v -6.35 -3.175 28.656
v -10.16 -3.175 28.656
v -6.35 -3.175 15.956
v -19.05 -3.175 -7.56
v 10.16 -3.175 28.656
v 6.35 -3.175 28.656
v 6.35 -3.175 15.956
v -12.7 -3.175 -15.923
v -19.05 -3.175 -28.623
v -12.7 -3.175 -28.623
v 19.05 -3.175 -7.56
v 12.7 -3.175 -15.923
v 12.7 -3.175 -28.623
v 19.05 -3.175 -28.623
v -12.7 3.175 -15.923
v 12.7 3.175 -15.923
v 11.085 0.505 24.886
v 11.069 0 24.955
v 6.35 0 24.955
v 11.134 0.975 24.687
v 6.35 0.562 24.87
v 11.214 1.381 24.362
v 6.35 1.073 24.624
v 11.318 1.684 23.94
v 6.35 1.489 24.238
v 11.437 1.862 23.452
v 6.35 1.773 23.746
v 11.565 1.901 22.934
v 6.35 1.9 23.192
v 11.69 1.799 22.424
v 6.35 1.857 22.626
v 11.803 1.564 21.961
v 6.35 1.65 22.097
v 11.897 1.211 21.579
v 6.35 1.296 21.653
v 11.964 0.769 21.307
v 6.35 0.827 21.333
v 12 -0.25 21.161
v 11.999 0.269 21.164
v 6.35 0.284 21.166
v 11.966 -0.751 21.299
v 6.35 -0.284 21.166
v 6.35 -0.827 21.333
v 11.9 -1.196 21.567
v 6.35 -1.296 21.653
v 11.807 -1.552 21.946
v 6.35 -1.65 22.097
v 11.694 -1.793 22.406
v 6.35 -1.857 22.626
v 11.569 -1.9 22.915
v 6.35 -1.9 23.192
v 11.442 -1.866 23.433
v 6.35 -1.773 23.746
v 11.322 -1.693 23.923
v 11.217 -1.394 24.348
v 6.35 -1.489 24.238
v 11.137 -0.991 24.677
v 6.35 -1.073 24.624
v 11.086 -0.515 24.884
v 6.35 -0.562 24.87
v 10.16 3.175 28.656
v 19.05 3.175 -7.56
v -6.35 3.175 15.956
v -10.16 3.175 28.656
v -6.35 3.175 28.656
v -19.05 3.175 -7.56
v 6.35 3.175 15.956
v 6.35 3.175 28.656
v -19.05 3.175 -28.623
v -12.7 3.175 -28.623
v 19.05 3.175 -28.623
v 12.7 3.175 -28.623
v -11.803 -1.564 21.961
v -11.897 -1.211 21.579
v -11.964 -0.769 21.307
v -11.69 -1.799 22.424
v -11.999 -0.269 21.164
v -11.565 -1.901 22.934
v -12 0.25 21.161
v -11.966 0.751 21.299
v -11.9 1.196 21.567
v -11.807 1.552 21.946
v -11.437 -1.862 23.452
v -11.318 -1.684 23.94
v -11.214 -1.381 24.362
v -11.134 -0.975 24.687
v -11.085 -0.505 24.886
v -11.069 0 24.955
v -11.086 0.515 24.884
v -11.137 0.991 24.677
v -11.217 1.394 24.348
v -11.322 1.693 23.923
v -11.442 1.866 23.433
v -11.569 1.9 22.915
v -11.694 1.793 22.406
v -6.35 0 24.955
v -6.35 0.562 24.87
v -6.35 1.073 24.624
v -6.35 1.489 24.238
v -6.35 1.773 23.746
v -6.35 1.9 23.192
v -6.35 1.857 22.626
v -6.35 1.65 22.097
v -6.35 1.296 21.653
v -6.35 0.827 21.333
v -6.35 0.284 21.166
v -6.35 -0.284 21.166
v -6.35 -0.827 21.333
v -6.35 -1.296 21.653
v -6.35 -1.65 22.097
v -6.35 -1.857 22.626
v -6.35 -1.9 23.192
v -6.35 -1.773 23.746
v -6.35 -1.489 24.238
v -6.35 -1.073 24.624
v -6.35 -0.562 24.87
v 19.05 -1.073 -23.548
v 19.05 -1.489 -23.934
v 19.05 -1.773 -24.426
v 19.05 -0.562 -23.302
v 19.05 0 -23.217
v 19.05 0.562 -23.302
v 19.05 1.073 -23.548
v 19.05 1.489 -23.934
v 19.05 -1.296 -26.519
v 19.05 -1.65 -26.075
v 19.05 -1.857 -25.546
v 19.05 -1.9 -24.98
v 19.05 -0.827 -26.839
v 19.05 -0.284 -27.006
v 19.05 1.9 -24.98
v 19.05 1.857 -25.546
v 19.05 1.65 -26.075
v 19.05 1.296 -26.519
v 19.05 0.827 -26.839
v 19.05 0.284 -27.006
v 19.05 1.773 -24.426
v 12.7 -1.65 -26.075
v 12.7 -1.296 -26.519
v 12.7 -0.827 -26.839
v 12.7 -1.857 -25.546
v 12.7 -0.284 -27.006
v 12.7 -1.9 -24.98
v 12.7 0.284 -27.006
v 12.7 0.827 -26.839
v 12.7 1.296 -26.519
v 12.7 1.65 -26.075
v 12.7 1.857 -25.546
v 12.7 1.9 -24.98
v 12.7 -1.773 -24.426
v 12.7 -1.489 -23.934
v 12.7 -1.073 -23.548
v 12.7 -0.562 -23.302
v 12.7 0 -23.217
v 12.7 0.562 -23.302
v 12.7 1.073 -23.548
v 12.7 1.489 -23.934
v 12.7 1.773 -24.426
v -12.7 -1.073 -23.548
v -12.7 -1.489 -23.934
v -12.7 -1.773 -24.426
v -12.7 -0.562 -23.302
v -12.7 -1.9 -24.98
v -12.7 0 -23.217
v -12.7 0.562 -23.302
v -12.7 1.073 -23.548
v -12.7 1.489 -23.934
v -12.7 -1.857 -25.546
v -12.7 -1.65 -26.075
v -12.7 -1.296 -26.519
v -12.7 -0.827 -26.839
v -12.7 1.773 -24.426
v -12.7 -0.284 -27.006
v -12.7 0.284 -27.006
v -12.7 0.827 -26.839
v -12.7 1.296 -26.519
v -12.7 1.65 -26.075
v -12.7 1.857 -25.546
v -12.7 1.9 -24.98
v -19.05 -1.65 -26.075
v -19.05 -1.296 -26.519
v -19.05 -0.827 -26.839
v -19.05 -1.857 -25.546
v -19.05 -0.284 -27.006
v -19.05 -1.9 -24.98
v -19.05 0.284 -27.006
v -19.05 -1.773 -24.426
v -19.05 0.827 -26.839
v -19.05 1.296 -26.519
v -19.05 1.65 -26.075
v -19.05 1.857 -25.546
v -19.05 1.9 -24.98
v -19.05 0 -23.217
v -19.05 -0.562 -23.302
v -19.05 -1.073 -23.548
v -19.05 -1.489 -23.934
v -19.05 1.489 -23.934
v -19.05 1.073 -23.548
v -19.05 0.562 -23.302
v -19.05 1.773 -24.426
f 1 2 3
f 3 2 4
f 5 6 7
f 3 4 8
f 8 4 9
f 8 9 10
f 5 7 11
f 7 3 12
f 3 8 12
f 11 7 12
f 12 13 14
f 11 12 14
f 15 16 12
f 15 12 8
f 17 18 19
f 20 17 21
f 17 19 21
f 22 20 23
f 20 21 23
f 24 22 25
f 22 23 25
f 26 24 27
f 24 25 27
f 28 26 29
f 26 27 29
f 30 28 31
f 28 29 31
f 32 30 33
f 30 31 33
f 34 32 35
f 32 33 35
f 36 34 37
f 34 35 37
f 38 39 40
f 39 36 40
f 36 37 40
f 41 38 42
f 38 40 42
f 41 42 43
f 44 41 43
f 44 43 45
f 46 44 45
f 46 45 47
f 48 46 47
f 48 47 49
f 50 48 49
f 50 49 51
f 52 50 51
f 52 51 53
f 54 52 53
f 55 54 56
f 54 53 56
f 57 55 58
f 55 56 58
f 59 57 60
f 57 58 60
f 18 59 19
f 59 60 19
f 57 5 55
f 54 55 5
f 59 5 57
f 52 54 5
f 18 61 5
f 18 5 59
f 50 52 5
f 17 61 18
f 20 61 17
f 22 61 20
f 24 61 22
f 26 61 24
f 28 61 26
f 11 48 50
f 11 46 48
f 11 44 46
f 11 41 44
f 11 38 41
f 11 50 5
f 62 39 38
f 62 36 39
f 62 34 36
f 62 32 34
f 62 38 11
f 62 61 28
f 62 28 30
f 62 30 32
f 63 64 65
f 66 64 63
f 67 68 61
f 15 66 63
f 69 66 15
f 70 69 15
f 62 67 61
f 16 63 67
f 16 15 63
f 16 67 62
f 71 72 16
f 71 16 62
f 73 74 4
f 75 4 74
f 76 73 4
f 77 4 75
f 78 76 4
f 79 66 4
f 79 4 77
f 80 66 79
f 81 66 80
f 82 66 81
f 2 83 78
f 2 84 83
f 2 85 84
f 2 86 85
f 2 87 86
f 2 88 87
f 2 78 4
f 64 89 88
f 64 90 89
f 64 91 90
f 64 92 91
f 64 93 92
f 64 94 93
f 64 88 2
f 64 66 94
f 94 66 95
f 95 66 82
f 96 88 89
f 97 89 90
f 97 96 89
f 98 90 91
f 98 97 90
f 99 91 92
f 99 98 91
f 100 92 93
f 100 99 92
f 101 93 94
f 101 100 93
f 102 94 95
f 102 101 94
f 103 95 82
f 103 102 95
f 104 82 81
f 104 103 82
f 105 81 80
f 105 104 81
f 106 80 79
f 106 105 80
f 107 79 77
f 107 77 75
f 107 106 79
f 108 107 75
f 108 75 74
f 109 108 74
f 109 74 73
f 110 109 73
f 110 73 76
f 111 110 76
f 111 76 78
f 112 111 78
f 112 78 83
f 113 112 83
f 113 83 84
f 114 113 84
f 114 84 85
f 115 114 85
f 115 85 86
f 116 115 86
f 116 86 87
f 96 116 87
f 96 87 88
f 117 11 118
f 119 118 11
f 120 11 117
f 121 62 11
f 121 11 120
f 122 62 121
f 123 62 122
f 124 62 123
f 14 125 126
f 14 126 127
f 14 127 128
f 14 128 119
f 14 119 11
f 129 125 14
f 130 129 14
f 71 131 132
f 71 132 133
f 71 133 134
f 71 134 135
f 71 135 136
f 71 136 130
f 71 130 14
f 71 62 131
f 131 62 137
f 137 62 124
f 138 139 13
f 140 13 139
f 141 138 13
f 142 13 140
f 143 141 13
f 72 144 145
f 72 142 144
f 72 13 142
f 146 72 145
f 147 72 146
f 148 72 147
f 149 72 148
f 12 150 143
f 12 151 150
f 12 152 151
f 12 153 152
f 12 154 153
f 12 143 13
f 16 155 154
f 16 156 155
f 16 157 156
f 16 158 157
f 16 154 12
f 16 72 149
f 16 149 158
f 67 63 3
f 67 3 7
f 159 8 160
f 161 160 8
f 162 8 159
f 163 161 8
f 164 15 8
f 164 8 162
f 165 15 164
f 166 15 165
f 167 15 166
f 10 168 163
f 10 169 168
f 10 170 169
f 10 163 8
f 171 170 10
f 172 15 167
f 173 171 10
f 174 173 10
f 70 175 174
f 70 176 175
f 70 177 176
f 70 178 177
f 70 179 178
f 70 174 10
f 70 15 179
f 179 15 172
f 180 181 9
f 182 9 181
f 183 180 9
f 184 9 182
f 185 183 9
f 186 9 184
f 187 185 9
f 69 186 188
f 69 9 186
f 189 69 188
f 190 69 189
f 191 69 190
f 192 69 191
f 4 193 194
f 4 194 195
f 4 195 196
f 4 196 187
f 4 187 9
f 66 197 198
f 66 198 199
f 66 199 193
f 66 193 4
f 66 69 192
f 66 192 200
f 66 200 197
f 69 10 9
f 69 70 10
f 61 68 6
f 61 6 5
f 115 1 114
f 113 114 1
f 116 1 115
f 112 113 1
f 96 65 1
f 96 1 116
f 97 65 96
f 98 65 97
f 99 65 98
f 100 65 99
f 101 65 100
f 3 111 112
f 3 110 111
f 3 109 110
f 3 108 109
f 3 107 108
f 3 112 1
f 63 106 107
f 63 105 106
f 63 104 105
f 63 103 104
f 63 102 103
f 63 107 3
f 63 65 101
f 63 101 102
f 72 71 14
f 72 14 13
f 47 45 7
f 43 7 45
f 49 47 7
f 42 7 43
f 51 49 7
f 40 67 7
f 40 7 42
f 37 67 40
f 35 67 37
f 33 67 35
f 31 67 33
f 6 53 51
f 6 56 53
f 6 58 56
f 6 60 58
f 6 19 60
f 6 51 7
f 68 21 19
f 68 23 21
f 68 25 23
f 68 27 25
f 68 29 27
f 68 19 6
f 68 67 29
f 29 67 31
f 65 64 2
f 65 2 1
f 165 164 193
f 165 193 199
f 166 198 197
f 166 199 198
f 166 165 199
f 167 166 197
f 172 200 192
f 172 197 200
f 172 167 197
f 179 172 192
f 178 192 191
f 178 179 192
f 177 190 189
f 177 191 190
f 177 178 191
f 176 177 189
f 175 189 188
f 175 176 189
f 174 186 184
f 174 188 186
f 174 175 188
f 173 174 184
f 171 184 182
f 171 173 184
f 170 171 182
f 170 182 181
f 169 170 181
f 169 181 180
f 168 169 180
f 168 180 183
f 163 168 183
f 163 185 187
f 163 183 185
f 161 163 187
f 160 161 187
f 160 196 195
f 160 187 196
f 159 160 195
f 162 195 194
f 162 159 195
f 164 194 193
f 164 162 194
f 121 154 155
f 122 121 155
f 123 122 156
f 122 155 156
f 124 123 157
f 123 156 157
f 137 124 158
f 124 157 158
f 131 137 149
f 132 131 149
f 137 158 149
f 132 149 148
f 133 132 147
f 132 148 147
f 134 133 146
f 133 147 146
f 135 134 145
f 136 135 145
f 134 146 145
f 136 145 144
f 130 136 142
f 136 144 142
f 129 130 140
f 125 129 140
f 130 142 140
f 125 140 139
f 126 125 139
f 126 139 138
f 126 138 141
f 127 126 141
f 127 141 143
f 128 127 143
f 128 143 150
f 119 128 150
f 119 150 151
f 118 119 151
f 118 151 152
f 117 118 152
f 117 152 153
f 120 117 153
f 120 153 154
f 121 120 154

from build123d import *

# Parameters (mm, degrees)
BOSS_EXTRUDE1_DEPTH     = 3.175
SKETCH2_R               = 1.905
CUT_EXTRUDE1_DEPTH      = 20.05
CUT_EXTRUDE1_DEPTH_BACK = 20.05


with BuildPart() as part:
    # Sketch1 → Boss-Extrude1 (new body, symmetric)
    with BuildSketch(Plane(origin=(0, 0, 0), x_dir=(1, 0, 0), z_dir=(0, 1, 0))):
        Polygon((-19.05, 28.623002286), (-19.05, 7.559996871), (-10.16, -28.655798535), (-6.35, -28.655798535), (-6.35, -15.955798535), (6.35, -15.955798535), (6.35, -28.655798535), (10.16, -28.655798535), (19.05, 7.559996871), (19.05, 28.623002286), (12.7, 28.623002286), (12.7, 15.923002286), (-12.7, 15.923002286), (-12.7, 28.623002286), align=None)
    extrude(amount=BOSS_EXTRUDE1_DEPTH, both=True)

    # Sketch2 → Cut-Extrude1 (cut, two sides)
    with BuildSketch(Plane.ZY) as cut_extrude1_sk:
        with Locations((-25.12220376, 0)):
            Circle(SKETCH2_R)
        with Locations((23.04976617, 0)):
            Circle(SKETCH2_R)
    extrude(amount=CUT_EXTRUDE1_DEPTH, mode=Mode.SUBTRACT)
    extrude(cut_extrude1_sk.sketch, amount=-CUT_EXTRUDE1_DEPTH_BACK, mode=Mode.SUBTRACT)


solid = part.part
